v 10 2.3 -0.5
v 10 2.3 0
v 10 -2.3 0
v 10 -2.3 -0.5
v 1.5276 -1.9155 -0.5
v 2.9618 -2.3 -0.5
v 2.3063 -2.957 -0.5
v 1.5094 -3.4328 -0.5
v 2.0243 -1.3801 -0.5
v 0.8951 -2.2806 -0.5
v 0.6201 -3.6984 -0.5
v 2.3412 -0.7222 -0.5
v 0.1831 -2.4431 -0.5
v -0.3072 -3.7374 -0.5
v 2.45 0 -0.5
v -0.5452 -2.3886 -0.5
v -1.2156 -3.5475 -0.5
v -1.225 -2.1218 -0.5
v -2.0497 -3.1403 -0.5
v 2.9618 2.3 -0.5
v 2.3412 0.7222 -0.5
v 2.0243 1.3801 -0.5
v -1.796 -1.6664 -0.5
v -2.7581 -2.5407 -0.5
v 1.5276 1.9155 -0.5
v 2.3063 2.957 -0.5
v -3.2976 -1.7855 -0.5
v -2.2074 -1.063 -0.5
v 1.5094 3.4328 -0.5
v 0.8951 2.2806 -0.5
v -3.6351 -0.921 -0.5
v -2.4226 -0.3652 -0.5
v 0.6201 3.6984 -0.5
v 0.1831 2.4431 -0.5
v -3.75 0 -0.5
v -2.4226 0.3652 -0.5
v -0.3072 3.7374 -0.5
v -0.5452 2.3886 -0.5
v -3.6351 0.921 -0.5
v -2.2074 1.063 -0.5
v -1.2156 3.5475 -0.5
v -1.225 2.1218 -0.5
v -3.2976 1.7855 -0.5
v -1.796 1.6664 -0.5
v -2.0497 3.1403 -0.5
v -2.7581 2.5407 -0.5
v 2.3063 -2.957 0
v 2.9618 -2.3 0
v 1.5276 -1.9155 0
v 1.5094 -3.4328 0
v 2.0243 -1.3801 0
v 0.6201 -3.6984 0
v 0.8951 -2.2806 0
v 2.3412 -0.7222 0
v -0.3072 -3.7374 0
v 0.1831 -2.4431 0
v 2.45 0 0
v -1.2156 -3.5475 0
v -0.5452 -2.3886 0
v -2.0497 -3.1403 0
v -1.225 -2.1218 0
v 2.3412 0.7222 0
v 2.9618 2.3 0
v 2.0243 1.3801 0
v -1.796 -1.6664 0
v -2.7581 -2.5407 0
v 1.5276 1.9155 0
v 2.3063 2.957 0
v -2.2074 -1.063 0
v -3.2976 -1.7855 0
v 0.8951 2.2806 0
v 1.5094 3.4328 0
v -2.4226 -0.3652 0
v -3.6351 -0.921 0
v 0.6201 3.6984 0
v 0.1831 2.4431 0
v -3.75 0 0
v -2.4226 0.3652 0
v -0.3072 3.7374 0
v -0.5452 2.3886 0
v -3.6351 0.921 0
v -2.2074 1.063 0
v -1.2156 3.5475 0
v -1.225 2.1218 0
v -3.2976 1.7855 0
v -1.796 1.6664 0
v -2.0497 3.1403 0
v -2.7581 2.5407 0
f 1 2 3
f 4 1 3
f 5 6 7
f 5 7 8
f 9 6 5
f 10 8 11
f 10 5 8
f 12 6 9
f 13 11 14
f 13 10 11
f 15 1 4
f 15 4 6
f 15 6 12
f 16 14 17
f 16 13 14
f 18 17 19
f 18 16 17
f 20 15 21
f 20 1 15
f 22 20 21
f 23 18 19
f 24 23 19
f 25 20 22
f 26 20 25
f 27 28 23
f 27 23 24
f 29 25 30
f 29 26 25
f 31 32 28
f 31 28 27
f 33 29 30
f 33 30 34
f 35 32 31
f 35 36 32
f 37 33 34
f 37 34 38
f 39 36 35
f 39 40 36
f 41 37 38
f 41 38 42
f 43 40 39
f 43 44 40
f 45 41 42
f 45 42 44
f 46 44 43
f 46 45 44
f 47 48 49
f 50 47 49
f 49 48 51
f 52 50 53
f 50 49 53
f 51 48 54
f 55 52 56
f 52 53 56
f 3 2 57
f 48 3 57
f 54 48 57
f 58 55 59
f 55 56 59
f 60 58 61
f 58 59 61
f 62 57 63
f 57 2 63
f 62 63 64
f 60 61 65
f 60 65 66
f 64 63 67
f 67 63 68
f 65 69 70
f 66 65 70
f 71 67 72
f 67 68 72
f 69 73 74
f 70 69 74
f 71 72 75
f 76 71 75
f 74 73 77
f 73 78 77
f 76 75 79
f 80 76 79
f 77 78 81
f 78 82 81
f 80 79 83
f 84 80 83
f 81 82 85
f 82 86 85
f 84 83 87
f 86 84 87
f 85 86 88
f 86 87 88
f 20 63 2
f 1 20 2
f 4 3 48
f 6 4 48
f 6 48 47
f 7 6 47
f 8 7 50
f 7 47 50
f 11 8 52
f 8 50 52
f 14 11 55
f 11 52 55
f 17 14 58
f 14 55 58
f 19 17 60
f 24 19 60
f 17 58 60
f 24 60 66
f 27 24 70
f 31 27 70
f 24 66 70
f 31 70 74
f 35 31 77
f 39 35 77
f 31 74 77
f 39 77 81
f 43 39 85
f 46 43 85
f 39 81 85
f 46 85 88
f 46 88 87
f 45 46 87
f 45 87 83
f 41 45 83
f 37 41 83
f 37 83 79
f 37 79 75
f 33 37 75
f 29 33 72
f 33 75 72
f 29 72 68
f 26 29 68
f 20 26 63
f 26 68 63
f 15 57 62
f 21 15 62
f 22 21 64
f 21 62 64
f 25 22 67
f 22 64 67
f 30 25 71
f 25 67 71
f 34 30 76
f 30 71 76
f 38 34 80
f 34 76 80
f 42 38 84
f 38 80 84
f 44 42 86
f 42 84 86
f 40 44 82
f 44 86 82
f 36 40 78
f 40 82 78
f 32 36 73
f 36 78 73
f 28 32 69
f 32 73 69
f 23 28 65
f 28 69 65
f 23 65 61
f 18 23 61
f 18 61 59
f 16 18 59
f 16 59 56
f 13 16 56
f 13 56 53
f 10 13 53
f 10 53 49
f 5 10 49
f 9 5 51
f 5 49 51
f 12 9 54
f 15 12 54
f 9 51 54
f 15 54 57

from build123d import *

# Parameters (mm, degrees)
BODY_SKETCH_R      = 2.45
BASE_FLANGE1_DEPTH = 0.5


# Sheet-metal steps are written as plain solids
with BuildPart() as part:
    # Body Sketch → Base-Flange1 (new body)
    with BuildSketch(Plane.XY):
        with BuildLine():
            Line((2.961840644, 2.3), (10, 2.3))
            Line((10, 2.3), (10, -2.3))
            Line((10, -2.3), (2.961840644, -2.3))
            ThreePointArc((2.961840644, -2.3), (-3.75, 0), (2.961840644, 2.3))
        make_face()
        Circle(BODY_SKETCH_R, mode=Mode.SUBTRACT)
    extrude(amount=-BASE_FLANGE1_DEPTH)


solid = part.part
